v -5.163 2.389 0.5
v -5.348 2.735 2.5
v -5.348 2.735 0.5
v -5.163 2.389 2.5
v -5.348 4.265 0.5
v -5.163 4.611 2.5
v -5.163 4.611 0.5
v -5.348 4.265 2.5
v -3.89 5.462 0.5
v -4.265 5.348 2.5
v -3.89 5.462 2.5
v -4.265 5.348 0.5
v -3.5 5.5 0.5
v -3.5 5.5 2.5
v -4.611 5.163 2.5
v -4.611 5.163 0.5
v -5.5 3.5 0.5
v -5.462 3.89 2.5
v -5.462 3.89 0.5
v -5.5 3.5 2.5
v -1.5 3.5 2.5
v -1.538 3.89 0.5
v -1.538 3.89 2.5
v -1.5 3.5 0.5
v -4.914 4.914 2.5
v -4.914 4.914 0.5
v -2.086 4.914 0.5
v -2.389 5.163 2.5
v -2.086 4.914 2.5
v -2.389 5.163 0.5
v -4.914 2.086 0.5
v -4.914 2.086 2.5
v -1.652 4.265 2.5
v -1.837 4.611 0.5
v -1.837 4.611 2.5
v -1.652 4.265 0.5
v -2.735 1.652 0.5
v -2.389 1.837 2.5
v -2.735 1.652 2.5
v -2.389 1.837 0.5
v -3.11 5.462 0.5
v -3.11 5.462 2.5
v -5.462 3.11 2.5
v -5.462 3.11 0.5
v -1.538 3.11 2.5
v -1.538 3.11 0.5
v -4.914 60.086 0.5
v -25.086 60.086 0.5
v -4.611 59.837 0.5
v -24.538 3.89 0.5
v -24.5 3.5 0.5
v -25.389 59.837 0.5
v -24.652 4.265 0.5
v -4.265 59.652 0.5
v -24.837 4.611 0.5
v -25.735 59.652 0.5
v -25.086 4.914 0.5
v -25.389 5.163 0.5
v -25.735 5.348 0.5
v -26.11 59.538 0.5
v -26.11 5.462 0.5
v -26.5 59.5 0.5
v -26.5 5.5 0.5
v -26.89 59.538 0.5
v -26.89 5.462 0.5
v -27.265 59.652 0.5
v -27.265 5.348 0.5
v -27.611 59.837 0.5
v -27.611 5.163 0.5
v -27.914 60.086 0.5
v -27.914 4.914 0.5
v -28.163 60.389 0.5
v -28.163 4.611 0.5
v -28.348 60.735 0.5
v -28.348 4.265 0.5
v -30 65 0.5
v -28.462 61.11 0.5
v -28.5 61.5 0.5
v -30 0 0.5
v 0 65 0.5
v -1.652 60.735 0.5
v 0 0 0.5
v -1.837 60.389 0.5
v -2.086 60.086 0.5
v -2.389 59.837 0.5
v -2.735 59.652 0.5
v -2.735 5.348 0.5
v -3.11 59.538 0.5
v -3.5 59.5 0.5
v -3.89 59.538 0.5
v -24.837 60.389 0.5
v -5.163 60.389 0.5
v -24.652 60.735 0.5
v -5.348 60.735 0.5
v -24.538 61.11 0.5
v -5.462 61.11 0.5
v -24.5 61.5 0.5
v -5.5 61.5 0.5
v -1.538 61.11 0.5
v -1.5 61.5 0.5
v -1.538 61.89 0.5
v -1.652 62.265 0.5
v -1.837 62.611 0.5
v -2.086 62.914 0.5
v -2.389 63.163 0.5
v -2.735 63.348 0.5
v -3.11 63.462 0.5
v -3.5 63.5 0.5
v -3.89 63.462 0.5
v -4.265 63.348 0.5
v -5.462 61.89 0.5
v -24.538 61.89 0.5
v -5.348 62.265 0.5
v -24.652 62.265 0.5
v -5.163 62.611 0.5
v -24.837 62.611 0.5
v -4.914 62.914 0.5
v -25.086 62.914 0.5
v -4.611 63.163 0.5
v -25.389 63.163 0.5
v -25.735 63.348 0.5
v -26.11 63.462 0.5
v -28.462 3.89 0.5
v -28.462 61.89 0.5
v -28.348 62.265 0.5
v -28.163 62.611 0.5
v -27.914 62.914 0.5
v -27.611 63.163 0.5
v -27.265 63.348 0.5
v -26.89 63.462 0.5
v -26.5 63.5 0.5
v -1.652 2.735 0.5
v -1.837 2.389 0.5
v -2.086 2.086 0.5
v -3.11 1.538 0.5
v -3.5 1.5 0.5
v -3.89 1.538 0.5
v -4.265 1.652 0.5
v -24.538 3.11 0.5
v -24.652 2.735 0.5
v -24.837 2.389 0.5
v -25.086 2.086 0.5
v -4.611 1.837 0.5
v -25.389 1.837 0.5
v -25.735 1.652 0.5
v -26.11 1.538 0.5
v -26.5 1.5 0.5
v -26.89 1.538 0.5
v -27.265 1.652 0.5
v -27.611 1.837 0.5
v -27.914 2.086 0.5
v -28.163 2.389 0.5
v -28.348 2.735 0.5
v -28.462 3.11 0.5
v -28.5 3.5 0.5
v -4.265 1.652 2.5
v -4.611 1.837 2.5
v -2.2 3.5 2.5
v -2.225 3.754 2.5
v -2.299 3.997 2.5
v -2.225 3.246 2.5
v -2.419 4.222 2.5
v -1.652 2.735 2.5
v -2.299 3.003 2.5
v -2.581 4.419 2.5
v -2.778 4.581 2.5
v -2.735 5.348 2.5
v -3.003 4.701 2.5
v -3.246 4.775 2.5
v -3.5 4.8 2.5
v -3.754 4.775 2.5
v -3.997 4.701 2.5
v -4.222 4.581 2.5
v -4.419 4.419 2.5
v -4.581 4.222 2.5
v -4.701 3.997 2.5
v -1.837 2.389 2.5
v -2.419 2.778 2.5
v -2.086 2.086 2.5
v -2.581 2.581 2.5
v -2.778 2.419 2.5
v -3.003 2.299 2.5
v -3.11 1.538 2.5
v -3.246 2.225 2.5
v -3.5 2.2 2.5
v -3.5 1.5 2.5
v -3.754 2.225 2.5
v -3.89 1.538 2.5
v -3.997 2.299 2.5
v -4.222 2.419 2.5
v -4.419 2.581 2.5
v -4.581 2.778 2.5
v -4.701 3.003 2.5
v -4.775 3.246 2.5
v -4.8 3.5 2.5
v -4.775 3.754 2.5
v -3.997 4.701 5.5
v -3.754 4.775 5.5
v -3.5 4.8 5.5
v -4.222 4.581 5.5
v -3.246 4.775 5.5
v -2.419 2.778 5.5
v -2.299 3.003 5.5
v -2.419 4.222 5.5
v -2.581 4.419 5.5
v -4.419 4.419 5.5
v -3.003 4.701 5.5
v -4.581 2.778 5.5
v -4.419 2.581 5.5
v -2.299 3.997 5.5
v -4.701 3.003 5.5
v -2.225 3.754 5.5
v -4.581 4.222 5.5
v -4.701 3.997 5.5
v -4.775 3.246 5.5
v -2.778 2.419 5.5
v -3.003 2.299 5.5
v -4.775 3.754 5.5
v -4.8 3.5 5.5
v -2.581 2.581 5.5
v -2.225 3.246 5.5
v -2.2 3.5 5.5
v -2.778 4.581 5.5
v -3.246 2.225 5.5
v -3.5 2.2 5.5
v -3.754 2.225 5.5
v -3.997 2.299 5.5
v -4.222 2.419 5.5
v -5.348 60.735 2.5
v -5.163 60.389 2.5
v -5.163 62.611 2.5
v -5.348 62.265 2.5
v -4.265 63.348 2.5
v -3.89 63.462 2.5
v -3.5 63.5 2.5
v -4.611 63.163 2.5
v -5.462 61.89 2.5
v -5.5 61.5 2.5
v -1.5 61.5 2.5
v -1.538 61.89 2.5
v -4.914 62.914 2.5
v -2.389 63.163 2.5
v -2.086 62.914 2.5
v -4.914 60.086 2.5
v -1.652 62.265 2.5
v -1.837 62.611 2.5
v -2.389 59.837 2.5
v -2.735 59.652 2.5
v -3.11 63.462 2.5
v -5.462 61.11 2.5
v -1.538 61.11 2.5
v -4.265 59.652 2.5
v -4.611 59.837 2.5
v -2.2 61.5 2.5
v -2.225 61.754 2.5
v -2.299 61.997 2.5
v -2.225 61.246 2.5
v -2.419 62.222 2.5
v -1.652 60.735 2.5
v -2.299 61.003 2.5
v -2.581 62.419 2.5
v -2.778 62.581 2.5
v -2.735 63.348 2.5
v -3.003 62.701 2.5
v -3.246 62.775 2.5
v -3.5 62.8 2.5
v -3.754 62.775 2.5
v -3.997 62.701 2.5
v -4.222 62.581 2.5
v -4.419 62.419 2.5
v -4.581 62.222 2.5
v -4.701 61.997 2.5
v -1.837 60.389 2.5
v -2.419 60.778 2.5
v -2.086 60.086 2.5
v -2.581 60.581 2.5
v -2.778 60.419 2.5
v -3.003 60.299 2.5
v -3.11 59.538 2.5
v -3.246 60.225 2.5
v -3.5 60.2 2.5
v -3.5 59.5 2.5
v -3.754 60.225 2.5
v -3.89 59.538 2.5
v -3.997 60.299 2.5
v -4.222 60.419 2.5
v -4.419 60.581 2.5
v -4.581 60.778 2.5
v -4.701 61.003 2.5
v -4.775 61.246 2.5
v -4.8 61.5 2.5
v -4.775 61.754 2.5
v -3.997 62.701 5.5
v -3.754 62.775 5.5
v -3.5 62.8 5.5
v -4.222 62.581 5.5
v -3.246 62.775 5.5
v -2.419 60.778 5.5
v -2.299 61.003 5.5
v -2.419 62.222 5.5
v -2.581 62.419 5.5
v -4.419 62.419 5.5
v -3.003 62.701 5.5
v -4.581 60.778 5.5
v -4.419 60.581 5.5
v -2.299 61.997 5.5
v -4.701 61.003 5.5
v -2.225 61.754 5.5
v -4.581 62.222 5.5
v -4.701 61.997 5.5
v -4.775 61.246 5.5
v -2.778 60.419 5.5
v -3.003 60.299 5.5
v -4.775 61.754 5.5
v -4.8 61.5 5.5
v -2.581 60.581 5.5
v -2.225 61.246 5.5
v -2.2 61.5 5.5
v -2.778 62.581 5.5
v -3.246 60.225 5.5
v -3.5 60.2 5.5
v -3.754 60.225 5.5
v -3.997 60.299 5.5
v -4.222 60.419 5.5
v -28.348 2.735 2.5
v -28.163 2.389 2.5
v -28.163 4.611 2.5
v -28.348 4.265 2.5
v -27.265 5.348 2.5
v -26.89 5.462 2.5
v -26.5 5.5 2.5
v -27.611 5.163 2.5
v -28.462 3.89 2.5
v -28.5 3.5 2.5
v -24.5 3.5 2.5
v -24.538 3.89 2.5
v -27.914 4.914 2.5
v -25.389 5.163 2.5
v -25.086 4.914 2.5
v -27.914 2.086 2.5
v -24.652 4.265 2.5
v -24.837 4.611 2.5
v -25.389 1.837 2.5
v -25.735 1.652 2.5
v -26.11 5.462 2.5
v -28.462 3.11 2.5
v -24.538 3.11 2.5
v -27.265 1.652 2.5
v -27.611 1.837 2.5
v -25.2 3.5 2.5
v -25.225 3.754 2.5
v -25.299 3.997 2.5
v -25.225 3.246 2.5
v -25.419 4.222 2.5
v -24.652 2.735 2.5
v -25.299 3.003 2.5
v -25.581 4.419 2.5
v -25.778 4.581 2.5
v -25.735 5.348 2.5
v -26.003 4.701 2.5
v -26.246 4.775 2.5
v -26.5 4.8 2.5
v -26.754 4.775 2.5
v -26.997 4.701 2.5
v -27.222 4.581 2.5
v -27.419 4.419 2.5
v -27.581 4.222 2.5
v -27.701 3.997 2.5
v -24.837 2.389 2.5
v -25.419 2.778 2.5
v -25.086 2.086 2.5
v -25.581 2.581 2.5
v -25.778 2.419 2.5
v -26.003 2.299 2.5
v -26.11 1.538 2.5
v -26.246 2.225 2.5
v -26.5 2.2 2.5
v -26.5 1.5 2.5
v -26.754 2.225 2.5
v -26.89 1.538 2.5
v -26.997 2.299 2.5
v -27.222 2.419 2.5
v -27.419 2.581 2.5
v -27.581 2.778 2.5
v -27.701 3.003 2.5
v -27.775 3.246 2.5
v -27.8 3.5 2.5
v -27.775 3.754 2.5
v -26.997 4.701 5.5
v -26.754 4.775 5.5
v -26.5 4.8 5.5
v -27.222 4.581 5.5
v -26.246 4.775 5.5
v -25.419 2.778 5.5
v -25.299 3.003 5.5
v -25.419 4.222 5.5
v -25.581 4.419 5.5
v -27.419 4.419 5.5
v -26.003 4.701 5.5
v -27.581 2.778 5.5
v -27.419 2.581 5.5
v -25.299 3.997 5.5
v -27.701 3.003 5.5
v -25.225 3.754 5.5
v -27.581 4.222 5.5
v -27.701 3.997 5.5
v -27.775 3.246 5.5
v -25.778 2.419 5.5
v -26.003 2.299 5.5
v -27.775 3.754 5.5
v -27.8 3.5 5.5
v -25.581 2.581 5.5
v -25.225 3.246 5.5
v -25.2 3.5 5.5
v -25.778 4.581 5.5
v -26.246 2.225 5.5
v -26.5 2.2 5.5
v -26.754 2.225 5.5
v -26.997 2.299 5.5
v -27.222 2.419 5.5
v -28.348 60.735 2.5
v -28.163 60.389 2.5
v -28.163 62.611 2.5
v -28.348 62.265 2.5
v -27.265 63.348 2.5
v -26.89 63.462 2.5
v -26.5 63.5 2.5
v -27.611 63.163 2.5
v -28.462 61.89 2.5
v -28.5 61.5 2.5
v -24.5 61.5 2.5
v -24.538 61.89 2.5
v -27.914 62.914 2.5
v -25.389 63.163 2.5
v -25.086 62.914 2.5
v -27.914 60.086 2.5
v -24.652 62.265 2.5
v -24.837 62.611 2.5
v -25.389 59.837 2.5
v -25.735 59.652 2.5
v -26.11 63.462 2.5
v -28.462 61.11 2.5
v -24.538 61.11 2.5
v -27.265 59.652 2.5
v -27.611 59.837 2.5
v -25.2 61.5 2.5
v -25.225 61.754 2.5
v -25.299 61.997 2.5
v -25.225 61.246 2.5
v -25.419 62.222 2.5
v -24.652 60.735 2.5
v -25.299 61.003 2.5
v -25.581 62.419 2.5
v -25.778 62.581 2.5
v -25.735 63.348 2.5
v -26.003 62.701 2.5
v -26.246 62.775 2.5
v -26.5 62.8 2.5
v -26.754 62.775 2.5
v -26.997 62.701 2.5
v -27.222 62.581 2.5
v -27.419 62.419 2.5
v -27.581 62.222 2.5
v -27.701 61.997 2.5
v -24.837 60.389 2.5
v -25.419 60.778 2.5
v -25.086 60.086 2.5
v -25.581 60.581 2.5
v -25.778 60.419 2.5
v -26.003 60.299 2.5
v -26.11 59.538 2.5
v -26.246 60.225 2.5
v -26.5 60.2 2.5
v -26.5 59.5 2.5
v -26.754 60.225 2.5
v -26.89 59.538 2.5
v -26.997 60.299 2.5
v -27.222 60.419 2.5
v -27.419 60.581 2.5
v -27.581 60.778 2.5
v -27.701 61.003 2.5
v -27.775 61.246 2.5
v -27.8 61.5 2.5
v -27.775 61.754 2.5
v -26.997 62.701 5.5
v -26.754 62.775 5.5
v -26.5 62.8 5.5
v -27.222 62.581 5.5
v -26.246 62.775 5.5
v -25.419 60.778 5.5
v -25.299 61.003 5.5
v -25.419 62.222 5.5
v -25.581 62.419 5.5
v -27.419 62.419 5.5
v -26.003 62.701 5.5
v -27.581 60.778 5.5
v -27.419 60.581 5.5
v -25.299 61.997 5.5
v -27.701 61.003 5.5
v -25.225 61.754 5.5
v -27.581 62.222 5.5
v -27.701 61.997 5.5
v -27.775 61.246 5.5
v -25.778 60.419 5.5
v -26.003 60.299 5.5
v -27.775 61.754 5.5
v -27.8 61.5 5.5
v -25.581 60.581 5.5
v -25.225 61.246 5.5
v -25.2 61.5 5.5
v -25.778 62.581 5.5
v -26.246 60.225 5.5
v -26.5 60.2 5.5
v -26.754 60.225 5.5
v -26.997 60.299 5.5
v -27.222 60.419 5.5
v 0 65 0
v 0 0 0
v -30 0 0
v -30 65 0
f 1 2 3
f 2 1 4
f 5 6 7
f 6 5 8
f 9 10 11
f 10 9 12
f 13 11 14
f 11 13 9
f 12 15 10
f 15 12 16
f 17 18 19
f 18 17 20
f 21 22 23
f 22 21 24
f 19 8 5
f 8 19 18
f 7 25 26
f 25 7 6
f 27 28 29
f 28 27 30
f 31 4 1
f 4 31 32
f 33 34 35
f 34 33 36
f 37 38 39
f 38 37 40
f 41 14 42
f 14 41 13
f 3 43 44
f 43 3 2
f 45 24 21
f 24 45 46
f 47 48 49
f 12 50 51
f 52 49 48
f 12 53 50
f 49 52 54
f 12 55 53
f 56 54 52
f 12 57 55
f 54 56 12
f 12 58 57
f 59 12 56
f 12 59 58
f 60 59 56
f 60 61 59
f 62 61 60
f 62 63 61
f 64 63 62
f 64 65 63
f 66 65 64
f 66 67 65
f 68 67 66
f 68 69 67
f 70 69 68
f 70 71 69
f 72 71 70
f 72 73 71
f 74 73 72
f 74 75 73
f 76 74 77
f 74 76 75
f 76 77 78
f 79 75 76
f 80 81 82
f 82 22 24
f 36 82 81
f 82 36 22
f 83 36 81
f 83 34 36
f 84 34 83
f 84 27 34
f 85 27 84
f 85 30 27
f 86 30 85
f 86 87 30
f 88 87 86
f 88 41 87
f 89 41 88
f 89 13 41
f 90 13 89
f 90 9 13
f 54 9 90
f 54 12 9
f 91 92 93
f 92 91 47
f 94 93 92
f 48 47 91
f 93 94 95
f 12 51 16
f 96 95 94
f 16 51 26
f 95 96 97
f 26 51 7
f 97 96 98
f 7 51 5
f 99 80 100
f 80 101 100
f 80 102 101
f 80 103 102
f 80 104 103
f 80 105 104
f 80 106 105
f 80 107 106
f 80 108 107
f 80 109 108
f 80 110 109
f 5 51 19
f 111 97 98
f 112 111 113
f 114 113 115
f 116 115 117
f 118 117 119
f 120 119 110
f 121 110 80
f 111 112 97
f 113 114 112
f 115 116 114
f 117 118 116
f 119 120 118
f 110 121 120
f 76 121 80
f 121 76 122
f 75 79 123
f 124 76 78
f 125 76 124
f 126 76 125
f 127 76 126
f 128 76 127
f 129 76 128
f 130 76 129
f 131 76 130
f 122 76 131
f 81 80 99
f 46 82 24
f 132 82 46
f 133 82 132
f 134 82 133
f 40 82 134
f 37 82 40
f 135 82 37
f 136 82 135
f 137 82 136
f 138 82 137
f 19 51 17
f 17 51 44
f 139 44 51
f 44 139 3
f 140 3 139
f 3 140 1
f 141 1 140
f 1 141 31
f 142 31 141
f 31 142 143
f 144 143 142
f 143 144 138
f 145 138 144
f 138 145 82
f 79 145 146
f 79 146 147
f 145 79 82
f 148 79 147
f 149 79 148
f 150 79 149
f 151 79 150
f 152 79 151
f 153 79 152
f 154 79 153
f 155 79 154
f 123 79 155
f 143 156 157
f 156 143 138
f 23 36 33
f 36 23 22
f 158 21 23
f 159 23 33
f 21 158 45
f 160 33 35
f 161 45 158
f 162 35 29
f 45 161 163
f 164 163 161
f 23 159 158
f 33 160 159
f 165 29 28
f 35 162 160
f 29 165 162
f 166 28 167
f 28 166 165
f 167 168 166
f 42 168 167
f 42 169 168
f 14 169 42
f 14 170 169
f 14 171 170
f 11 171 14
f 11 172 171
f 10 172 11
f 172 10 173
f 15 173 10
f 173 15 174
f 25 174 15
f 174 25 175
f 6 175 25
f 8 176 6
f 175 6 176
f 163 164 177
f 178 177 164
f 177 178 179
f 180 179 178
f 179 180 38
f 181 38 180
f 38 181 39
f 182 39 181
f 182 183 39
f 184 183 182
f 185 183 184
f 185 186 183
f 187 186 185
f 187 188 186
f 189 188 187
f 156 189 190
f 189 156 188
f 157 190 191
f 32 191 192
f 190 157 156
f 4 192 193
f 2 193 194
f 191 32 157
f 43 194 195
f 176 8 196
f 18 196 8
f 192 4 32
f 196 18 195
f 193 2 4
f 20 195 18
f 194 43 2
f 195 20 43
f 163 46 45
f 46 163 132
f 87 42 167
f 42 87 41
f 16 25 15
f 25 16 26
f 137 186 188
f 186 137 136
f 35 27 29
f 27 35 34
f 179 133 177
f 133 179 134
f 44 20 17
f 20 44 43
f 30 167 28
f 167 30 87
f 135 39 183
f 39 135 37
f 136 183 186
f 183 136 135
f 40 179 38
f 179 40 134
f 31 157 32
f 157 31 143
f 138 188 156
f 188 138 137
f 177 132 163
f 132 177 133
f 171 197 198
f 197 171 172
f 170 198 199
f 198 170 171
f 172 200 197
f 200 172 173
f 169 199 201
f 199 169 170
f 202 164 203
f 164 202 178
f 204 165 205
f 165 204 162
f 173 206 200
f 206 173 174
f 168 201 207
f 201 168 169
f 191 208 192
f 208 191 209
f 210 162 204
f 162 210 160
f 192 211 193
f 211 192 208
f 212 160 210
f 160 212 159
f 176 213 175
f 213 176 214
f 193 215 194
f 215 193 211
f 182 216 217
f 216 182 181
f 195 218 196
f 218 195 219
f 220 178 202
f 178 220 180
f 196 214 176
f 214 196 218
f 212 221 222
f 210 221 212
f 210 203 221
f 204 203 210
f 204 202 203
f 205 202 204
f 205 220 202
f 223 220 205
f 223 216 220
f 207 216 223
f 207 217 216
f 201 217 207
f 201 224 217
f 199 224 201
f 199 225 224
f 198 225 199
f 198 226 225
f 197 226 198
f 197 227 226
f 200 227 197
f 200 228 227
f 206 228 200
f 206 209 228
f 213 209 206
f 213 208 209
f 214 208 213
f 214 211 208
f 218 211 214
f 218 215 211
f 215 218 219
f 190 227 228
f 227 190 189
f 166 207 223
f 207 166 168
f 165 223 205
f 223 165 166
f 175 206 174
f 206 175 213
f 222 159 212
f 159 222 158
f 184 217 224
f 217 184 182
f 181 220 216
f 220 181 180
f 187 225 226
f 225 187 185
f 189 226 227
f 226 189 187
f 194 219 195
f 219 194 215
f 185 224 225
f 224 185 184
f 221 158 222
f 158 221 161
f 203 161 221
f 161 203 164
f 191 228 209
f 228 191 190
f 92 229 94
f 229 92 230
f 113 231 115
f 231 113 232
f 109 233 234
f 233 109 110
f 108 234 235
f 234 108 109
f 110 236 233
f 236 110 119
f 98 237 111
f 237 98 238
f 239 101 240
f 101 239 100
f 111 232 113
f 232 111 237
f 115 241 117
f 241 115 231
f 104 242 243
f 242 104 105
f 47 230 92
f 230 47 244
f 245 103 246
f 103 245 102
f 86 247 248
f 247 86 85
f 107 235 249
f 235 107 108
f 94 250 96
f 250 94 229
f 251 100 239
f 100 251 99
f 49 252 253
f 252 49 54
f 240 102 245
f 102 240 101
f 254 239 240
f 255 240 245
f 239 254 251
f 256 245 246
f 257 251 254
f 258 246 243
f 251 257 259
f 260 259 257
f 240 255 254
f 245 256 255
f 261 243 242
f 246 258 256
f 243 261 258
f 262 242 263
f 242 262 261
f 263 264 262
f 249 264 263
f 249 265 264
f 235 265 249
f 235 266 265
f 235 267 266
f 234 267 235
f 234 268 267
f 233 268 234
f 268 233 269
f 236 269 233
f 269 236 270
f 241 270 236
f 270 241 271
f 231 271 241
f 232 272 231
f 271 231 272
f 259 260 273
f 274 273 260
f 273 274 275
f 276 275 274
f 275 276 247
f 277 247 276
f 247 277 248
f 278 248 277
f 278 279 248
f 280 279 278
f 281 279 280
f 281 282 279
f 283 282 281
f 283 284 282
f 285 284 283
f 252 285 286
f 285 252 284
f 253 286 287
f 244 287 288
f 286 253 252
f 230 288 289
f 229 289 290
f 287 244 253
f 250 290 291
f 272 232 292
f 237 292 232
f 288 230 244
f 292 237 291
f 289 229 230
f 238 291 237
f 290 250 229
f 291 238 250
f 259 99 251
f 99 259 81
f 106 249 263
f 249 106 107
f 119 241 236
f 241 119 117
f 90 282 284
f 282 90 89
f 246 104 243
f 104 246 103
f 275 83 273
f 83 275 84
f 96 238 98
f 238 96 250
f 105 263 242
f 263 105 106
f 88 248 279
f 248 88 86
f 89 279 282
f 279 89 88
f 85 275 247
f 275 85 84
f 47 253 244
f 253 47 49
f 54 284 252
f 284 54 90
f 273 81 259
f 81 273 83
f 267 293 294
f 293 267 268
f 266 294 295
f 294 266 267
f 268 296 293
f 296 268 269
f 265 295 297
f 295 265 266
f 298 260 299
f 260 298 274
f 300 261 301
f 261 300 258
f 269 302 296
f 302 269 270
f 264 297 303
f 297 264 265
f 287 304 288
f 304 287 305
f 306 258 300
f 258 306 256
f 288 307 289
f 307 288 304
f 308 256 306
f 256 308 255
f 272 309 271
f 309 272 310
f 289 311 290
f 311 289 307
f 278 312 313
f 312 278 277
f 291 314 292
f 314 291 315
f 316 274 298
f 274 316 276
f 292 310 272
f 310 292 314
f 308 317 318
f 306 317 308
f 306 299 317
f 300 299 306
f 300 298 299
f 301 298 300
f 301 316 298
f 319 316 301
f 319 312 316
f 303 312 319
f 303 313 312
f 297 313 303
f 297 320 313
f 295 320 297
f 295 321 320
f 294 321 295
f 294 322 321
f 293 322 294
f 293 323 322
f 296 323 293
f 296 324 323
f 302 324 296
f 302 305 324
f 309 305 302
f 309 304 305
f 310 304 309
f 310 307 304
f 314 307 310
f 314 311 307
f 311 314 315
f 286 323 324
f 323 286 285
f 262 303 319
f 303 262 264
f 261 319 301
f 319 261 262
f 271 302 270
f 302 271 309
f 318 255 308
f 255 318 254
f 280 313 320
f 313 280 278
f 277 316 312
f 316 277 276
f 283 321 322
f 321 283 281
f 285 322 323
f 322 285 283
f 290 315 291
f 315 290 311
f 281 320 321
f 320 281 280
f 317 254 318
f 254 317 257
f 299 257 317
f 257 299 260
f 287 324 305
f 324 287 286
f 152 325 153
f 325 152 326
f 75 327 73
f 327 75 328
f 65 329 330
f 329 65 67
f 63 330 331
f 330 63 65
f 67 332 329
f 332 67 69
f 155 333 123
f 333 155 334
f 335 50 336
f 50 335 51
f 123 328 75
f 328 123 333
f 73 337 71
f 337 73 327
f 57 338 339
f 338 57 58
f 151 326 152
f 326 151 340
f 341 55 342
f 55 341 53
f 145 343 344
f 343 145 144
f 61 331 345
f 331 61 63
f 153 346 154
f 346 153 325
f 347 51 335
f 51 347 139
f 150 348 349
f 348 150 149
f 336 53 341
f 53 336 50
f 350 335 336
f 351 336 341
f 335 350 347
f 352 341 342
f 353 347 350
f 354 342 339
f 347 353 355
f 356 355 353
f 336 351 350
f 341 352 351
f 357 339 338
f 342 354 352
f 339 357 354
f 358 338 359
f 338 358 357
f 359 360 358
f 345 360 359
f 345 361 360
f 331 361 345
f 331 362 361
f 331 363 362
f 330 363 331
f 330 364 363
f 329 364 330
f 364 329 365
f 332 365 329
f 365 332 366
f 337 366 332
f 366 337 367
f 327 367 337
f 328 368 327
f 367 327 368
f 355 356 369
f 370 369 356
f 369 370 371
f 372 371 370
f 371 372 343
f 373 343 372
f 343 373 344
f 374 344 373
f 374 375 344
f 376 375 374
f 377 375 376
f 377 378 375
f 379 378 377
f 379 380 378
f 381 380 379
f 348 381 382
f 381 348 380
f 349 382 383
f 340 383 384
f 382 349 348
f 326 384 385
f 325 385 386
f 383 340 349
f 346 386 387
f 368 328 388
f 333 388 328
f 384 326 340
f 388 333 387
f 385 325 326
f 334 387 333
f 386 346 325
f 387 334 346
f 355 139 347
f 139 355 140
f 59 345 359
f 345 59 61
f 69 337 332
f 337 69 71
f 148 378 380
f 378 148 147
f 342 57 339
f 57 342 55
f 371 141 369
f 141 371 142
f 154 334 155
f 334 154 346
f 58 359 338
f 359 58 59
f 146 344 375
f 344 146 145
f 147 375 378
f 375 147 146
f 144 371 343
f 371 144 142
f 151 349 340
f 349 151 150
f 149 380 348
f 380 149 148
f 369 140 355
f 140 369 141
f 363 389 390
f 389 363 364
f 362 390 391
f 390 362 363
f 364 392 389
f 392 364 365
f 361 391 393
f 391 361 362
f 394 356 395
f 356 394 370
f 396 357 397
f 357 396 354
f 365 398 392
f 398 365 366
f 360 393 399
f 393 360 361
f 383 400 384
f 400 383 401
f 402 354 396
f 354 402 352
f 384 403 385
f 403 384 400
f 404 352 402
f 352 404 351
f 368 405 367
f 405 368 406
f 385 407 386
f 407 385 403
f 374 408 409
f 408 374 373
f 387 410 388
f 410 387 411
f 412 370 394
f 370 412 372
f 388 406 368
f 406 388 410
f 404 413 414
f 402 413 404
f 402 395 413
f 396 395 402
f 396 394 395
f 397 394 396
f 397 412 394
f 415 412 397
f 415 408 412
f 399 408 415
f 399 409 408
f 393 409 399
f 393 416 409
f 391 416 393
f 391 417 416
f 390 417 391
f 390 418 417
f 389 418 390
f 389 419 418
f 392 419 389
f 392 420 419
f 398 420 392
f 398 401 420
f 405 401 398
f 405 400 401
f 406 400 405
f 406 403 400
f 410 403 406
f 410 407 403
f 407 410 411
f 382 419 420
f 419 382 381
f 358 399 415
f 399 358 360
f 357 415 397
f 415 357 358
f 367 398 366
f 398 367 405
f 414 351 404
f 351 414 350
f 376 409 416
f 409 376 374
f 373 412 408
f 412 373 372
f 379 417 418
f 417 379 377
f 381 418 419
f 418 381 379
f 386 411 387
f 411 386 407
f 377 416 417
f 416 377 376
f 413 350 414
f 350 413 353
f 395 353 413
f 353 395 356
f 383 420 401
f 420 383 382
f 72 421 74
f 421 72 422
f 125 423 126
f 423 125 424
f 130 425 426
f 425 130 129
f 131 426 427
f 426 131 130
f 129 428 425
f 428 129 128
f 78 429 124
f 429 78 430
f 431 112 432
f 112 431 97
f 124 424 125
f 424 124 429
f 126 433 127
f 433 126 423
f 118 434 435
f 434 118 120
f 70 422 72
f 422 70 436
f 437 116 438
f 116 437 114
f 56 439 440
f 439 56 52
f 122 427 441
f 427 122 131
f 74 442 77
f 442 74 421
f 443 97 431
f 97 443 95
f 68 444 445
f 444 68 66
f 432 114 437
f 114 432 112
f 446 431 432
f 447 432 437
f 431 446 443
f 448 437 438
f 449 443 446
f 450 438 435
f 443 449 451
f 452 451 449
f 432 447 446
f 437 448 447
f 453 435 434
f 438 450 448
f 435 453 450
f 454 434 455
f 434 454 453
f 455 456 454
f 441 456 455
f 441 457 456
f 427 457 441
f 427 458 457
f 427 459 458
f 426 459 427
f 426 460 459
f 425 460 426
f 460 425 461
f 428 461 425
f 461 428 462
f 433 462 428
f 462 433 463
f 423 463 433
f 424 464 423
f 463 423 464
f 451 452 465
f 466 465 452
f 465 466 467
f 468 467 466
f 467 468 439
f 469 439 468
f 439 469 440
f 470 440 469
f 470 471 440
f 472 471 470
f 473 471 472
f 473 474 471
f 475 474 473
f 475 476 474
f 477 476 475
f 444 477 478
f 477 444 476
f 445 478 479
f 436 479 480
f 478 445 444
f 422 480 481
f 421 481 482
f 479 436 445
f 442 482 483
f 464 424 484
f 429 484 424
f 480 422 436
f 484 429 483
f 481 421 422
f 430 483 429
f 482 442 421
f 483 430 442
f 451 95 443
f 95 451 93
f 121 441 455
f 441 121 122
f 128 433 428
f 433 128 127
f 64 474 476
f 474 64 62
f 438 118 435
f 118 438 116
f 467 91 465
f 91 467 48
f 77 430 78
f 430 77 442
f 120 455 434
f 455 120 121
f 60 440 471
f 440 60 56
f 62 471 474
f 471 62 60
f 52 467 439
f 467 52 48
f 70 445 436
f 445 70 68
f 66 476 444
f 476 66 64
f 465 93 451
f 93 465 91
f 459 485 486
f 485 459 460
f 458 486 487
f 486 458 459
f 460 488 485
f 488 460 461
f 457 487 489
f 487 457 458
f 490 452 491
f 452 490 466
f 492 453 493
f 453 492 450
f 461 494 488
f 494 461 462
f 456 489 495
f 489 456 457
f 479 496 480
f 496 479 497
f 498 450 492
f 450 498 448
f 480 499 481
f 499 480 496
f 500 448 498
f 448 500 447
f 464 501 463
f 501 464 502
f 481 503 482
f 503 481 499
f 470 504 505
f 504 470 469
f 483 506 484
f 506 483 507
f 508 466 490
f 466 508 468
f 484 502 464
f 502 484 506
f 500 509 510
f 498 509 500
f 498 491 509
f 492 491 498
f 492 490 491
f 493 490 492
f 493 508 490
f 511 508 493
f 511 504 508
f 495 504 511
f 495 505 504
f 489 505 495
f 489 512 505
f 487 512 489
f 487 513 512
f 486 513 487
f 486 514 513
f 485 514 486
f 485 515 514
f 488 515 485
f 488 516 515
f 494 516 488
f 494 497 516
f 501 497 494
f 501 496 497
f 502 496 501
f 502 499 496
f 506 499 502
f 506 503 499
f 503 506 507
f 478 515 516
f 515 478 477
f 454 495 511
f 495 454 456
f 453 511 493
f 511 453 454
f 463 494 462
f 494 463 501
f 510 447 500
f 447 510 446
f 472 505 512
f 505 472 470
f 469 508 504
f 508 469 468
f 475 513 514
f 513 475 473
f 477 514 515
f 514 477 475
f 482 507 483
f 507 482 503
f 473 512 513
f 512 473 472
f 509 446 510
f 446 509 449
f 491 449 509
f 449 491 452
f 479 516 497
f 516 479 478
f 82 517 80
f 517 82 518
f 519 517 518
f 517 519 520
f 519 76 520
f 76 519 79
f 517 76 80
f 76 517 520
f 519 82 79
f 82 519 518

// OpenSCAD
// file: generic.scad
module myBox(w,d,h) 
{
    translate([-1,-1,-1])
    difference() {
        cube([w+2, d+2, h+1]);
        translate([1, 1, 1])
            cube([w, d, h]);
    }
}

module stud(radius, h)
{    
    union() {
        cylinder(h, radius + 0.7, radius+0.7);
        translate([0,0, h])
        cylinder(3, radius, radius);        
    }
}

module studHole(radius, h)
{    
    difference() {
        cylinder(h, radius + 1, radius+1);
        translate([0,0,h-2])
        cylinder(2, radius, radius);
    }    
}
// file: pico.scad
use <generic.scad>;

module picoStuds()
{
    union() {
        translate([4.8, 2, 0]) stud(1, 5);
        translate([16.2, 2, 0]) stud(1, 5);
        translate([4.8, 49, 0]) stud(1, 5);
        translate([16.2, 49, 0]) stud(1, 5);
    }
}

module picoStudHoles(h)
{    
    union() {
        translate([4.8, 2, 0]) studHole(1, h);
        translate([16.2, 2, 0])studHole(1, h);
        translate([4.8, 49, 0]) studHole(1, h);
        translate([16.2, 49, 0]) studHole(1, h);
    }
}

module piZeroStuds(h)
{
    union() {
        translate([3.5, 3.5, 0]) stud(1.3, h);
        translate([61.5, 3.5, 0]) stud(1.3, h);
        translate([3.5, 26.5, 0]) stud(1.3, h);
        translate([61.5, 26.5, 0]) stud(1.3, h);
    }
}
// main file
$fn=32;

use <pico.scad>;

translate([-30,0,0]) cube ([30,65,0.5]);
translate([0, 0,0.5]) rotate([0,0,90]) piZeroStuds(2);
